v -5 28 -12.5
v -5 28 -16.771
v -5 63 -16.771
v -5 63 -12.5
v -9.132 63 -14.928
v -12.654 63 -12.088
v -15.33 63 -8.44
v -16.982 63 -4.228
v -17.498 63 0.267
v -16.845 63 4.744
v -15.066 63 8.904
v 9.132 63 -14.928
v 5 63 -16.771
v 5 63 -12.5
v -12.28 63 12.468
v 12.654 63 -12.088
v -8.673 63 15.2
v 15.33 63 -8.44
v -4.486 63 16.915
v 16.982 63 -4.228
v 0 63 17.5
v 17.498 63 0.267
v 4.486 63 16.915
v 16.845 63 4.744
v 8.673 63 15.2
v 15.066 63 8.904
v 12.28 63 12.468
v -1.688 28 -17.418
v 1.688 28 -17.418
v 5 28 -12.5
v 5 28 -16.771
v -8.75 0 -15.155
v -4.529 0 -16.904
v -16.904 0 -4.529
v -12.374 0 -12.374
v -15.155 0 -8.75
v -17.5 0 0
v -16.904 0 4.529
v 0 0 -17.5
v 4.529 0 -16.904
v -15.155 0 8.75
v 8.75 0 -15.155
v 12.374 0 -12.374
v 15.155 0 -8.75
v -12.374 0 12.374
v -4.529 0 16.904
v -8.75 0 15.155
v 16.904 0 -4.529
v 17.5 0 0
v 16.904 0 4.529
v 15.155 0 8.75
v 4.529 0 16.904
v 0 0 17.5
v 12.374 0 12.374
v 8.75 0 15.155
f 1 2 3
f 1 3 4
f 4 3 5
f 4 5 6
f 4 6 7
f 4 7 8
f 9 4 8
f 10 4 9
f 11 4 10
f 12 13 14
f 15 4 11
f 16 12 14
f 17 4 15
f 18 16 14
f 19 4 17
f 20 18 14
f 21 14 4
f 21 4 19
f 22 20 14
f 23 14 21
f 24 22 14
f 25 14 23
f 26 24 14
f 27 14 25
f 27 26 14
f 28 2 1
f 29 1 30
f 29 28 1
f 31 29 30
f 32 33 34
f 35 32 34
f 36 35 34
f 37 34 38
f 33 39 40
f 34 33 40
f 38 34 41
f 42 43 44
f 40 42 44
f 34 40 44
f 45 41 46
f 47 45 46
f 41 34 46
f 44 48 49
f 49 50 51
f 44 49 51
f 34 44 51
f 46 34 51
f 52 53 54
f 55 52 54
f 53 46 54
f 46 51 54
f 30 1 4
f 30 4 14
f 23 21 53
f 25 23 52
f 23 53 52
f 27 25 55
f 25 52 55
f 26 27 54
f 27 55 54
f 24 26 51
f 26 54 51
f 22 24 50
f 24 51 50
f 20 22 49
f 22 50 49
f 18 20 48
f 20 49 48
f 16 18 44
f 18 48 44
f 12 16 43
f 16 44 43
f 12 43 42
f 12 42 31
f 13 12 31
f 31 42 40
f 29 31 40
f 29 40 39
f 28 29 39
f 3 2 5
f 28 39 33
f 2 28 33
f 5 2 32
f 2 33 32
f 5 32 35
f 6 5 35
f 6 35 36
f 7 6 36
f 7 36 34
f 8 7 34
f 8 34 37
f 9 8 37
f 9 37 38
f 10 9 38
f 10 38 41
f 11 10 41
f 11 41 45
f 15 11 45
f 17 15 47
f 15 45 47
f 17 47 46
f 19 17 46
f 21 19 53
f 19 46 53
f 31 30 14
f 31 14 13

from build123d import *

# Parameters (mm, degrees)
SKETCH1_R           = 17.5
BOSS_EXTRUDE1_DEPTH = 63
CUT_EXTRUDE1_START  = -35
CUT_EXTRUDE1_DEPTH  = 35


with BuildPart() as part:
    # Sketch1 → Boss-Extrude1 (new body)
    with BuildSketch(Plane(origin=(0, 0, 0), x_dir=(1, 0, 0), z_dir=(0, 1, 0))):
        with Locations(Location((0, 0, 0), (0, 0, 270))):
            Circle(SKETCH1_R)
    extrude(amount=BOSS_EXTRUDE1_DEPTH)

    # Sketch2 → Cut-Extrude1 (cut)
    with BuildSketch(Plane(origin=(0, 63, 0), x_dir=(1, 0, 0), z_dir=(0, 1, 0)).offset(CUT_EXTRUDE1_START)):
        with BuildLine():
            Line((-5, 12.5), (5, 12.5))
            Line((5, 12.5), (5, 16.770509831))
            ThreePointArc((5, 16.770509831), (0, 17.5), (-5, 16.770509831))
            Line((-5, 16.770509831), (-5, 12.5))
        make_face()
    extrude(amount=CUT_EXTRUDE1_DEPTH, mode=Mode.SUBTRACT)


solid = part.part
